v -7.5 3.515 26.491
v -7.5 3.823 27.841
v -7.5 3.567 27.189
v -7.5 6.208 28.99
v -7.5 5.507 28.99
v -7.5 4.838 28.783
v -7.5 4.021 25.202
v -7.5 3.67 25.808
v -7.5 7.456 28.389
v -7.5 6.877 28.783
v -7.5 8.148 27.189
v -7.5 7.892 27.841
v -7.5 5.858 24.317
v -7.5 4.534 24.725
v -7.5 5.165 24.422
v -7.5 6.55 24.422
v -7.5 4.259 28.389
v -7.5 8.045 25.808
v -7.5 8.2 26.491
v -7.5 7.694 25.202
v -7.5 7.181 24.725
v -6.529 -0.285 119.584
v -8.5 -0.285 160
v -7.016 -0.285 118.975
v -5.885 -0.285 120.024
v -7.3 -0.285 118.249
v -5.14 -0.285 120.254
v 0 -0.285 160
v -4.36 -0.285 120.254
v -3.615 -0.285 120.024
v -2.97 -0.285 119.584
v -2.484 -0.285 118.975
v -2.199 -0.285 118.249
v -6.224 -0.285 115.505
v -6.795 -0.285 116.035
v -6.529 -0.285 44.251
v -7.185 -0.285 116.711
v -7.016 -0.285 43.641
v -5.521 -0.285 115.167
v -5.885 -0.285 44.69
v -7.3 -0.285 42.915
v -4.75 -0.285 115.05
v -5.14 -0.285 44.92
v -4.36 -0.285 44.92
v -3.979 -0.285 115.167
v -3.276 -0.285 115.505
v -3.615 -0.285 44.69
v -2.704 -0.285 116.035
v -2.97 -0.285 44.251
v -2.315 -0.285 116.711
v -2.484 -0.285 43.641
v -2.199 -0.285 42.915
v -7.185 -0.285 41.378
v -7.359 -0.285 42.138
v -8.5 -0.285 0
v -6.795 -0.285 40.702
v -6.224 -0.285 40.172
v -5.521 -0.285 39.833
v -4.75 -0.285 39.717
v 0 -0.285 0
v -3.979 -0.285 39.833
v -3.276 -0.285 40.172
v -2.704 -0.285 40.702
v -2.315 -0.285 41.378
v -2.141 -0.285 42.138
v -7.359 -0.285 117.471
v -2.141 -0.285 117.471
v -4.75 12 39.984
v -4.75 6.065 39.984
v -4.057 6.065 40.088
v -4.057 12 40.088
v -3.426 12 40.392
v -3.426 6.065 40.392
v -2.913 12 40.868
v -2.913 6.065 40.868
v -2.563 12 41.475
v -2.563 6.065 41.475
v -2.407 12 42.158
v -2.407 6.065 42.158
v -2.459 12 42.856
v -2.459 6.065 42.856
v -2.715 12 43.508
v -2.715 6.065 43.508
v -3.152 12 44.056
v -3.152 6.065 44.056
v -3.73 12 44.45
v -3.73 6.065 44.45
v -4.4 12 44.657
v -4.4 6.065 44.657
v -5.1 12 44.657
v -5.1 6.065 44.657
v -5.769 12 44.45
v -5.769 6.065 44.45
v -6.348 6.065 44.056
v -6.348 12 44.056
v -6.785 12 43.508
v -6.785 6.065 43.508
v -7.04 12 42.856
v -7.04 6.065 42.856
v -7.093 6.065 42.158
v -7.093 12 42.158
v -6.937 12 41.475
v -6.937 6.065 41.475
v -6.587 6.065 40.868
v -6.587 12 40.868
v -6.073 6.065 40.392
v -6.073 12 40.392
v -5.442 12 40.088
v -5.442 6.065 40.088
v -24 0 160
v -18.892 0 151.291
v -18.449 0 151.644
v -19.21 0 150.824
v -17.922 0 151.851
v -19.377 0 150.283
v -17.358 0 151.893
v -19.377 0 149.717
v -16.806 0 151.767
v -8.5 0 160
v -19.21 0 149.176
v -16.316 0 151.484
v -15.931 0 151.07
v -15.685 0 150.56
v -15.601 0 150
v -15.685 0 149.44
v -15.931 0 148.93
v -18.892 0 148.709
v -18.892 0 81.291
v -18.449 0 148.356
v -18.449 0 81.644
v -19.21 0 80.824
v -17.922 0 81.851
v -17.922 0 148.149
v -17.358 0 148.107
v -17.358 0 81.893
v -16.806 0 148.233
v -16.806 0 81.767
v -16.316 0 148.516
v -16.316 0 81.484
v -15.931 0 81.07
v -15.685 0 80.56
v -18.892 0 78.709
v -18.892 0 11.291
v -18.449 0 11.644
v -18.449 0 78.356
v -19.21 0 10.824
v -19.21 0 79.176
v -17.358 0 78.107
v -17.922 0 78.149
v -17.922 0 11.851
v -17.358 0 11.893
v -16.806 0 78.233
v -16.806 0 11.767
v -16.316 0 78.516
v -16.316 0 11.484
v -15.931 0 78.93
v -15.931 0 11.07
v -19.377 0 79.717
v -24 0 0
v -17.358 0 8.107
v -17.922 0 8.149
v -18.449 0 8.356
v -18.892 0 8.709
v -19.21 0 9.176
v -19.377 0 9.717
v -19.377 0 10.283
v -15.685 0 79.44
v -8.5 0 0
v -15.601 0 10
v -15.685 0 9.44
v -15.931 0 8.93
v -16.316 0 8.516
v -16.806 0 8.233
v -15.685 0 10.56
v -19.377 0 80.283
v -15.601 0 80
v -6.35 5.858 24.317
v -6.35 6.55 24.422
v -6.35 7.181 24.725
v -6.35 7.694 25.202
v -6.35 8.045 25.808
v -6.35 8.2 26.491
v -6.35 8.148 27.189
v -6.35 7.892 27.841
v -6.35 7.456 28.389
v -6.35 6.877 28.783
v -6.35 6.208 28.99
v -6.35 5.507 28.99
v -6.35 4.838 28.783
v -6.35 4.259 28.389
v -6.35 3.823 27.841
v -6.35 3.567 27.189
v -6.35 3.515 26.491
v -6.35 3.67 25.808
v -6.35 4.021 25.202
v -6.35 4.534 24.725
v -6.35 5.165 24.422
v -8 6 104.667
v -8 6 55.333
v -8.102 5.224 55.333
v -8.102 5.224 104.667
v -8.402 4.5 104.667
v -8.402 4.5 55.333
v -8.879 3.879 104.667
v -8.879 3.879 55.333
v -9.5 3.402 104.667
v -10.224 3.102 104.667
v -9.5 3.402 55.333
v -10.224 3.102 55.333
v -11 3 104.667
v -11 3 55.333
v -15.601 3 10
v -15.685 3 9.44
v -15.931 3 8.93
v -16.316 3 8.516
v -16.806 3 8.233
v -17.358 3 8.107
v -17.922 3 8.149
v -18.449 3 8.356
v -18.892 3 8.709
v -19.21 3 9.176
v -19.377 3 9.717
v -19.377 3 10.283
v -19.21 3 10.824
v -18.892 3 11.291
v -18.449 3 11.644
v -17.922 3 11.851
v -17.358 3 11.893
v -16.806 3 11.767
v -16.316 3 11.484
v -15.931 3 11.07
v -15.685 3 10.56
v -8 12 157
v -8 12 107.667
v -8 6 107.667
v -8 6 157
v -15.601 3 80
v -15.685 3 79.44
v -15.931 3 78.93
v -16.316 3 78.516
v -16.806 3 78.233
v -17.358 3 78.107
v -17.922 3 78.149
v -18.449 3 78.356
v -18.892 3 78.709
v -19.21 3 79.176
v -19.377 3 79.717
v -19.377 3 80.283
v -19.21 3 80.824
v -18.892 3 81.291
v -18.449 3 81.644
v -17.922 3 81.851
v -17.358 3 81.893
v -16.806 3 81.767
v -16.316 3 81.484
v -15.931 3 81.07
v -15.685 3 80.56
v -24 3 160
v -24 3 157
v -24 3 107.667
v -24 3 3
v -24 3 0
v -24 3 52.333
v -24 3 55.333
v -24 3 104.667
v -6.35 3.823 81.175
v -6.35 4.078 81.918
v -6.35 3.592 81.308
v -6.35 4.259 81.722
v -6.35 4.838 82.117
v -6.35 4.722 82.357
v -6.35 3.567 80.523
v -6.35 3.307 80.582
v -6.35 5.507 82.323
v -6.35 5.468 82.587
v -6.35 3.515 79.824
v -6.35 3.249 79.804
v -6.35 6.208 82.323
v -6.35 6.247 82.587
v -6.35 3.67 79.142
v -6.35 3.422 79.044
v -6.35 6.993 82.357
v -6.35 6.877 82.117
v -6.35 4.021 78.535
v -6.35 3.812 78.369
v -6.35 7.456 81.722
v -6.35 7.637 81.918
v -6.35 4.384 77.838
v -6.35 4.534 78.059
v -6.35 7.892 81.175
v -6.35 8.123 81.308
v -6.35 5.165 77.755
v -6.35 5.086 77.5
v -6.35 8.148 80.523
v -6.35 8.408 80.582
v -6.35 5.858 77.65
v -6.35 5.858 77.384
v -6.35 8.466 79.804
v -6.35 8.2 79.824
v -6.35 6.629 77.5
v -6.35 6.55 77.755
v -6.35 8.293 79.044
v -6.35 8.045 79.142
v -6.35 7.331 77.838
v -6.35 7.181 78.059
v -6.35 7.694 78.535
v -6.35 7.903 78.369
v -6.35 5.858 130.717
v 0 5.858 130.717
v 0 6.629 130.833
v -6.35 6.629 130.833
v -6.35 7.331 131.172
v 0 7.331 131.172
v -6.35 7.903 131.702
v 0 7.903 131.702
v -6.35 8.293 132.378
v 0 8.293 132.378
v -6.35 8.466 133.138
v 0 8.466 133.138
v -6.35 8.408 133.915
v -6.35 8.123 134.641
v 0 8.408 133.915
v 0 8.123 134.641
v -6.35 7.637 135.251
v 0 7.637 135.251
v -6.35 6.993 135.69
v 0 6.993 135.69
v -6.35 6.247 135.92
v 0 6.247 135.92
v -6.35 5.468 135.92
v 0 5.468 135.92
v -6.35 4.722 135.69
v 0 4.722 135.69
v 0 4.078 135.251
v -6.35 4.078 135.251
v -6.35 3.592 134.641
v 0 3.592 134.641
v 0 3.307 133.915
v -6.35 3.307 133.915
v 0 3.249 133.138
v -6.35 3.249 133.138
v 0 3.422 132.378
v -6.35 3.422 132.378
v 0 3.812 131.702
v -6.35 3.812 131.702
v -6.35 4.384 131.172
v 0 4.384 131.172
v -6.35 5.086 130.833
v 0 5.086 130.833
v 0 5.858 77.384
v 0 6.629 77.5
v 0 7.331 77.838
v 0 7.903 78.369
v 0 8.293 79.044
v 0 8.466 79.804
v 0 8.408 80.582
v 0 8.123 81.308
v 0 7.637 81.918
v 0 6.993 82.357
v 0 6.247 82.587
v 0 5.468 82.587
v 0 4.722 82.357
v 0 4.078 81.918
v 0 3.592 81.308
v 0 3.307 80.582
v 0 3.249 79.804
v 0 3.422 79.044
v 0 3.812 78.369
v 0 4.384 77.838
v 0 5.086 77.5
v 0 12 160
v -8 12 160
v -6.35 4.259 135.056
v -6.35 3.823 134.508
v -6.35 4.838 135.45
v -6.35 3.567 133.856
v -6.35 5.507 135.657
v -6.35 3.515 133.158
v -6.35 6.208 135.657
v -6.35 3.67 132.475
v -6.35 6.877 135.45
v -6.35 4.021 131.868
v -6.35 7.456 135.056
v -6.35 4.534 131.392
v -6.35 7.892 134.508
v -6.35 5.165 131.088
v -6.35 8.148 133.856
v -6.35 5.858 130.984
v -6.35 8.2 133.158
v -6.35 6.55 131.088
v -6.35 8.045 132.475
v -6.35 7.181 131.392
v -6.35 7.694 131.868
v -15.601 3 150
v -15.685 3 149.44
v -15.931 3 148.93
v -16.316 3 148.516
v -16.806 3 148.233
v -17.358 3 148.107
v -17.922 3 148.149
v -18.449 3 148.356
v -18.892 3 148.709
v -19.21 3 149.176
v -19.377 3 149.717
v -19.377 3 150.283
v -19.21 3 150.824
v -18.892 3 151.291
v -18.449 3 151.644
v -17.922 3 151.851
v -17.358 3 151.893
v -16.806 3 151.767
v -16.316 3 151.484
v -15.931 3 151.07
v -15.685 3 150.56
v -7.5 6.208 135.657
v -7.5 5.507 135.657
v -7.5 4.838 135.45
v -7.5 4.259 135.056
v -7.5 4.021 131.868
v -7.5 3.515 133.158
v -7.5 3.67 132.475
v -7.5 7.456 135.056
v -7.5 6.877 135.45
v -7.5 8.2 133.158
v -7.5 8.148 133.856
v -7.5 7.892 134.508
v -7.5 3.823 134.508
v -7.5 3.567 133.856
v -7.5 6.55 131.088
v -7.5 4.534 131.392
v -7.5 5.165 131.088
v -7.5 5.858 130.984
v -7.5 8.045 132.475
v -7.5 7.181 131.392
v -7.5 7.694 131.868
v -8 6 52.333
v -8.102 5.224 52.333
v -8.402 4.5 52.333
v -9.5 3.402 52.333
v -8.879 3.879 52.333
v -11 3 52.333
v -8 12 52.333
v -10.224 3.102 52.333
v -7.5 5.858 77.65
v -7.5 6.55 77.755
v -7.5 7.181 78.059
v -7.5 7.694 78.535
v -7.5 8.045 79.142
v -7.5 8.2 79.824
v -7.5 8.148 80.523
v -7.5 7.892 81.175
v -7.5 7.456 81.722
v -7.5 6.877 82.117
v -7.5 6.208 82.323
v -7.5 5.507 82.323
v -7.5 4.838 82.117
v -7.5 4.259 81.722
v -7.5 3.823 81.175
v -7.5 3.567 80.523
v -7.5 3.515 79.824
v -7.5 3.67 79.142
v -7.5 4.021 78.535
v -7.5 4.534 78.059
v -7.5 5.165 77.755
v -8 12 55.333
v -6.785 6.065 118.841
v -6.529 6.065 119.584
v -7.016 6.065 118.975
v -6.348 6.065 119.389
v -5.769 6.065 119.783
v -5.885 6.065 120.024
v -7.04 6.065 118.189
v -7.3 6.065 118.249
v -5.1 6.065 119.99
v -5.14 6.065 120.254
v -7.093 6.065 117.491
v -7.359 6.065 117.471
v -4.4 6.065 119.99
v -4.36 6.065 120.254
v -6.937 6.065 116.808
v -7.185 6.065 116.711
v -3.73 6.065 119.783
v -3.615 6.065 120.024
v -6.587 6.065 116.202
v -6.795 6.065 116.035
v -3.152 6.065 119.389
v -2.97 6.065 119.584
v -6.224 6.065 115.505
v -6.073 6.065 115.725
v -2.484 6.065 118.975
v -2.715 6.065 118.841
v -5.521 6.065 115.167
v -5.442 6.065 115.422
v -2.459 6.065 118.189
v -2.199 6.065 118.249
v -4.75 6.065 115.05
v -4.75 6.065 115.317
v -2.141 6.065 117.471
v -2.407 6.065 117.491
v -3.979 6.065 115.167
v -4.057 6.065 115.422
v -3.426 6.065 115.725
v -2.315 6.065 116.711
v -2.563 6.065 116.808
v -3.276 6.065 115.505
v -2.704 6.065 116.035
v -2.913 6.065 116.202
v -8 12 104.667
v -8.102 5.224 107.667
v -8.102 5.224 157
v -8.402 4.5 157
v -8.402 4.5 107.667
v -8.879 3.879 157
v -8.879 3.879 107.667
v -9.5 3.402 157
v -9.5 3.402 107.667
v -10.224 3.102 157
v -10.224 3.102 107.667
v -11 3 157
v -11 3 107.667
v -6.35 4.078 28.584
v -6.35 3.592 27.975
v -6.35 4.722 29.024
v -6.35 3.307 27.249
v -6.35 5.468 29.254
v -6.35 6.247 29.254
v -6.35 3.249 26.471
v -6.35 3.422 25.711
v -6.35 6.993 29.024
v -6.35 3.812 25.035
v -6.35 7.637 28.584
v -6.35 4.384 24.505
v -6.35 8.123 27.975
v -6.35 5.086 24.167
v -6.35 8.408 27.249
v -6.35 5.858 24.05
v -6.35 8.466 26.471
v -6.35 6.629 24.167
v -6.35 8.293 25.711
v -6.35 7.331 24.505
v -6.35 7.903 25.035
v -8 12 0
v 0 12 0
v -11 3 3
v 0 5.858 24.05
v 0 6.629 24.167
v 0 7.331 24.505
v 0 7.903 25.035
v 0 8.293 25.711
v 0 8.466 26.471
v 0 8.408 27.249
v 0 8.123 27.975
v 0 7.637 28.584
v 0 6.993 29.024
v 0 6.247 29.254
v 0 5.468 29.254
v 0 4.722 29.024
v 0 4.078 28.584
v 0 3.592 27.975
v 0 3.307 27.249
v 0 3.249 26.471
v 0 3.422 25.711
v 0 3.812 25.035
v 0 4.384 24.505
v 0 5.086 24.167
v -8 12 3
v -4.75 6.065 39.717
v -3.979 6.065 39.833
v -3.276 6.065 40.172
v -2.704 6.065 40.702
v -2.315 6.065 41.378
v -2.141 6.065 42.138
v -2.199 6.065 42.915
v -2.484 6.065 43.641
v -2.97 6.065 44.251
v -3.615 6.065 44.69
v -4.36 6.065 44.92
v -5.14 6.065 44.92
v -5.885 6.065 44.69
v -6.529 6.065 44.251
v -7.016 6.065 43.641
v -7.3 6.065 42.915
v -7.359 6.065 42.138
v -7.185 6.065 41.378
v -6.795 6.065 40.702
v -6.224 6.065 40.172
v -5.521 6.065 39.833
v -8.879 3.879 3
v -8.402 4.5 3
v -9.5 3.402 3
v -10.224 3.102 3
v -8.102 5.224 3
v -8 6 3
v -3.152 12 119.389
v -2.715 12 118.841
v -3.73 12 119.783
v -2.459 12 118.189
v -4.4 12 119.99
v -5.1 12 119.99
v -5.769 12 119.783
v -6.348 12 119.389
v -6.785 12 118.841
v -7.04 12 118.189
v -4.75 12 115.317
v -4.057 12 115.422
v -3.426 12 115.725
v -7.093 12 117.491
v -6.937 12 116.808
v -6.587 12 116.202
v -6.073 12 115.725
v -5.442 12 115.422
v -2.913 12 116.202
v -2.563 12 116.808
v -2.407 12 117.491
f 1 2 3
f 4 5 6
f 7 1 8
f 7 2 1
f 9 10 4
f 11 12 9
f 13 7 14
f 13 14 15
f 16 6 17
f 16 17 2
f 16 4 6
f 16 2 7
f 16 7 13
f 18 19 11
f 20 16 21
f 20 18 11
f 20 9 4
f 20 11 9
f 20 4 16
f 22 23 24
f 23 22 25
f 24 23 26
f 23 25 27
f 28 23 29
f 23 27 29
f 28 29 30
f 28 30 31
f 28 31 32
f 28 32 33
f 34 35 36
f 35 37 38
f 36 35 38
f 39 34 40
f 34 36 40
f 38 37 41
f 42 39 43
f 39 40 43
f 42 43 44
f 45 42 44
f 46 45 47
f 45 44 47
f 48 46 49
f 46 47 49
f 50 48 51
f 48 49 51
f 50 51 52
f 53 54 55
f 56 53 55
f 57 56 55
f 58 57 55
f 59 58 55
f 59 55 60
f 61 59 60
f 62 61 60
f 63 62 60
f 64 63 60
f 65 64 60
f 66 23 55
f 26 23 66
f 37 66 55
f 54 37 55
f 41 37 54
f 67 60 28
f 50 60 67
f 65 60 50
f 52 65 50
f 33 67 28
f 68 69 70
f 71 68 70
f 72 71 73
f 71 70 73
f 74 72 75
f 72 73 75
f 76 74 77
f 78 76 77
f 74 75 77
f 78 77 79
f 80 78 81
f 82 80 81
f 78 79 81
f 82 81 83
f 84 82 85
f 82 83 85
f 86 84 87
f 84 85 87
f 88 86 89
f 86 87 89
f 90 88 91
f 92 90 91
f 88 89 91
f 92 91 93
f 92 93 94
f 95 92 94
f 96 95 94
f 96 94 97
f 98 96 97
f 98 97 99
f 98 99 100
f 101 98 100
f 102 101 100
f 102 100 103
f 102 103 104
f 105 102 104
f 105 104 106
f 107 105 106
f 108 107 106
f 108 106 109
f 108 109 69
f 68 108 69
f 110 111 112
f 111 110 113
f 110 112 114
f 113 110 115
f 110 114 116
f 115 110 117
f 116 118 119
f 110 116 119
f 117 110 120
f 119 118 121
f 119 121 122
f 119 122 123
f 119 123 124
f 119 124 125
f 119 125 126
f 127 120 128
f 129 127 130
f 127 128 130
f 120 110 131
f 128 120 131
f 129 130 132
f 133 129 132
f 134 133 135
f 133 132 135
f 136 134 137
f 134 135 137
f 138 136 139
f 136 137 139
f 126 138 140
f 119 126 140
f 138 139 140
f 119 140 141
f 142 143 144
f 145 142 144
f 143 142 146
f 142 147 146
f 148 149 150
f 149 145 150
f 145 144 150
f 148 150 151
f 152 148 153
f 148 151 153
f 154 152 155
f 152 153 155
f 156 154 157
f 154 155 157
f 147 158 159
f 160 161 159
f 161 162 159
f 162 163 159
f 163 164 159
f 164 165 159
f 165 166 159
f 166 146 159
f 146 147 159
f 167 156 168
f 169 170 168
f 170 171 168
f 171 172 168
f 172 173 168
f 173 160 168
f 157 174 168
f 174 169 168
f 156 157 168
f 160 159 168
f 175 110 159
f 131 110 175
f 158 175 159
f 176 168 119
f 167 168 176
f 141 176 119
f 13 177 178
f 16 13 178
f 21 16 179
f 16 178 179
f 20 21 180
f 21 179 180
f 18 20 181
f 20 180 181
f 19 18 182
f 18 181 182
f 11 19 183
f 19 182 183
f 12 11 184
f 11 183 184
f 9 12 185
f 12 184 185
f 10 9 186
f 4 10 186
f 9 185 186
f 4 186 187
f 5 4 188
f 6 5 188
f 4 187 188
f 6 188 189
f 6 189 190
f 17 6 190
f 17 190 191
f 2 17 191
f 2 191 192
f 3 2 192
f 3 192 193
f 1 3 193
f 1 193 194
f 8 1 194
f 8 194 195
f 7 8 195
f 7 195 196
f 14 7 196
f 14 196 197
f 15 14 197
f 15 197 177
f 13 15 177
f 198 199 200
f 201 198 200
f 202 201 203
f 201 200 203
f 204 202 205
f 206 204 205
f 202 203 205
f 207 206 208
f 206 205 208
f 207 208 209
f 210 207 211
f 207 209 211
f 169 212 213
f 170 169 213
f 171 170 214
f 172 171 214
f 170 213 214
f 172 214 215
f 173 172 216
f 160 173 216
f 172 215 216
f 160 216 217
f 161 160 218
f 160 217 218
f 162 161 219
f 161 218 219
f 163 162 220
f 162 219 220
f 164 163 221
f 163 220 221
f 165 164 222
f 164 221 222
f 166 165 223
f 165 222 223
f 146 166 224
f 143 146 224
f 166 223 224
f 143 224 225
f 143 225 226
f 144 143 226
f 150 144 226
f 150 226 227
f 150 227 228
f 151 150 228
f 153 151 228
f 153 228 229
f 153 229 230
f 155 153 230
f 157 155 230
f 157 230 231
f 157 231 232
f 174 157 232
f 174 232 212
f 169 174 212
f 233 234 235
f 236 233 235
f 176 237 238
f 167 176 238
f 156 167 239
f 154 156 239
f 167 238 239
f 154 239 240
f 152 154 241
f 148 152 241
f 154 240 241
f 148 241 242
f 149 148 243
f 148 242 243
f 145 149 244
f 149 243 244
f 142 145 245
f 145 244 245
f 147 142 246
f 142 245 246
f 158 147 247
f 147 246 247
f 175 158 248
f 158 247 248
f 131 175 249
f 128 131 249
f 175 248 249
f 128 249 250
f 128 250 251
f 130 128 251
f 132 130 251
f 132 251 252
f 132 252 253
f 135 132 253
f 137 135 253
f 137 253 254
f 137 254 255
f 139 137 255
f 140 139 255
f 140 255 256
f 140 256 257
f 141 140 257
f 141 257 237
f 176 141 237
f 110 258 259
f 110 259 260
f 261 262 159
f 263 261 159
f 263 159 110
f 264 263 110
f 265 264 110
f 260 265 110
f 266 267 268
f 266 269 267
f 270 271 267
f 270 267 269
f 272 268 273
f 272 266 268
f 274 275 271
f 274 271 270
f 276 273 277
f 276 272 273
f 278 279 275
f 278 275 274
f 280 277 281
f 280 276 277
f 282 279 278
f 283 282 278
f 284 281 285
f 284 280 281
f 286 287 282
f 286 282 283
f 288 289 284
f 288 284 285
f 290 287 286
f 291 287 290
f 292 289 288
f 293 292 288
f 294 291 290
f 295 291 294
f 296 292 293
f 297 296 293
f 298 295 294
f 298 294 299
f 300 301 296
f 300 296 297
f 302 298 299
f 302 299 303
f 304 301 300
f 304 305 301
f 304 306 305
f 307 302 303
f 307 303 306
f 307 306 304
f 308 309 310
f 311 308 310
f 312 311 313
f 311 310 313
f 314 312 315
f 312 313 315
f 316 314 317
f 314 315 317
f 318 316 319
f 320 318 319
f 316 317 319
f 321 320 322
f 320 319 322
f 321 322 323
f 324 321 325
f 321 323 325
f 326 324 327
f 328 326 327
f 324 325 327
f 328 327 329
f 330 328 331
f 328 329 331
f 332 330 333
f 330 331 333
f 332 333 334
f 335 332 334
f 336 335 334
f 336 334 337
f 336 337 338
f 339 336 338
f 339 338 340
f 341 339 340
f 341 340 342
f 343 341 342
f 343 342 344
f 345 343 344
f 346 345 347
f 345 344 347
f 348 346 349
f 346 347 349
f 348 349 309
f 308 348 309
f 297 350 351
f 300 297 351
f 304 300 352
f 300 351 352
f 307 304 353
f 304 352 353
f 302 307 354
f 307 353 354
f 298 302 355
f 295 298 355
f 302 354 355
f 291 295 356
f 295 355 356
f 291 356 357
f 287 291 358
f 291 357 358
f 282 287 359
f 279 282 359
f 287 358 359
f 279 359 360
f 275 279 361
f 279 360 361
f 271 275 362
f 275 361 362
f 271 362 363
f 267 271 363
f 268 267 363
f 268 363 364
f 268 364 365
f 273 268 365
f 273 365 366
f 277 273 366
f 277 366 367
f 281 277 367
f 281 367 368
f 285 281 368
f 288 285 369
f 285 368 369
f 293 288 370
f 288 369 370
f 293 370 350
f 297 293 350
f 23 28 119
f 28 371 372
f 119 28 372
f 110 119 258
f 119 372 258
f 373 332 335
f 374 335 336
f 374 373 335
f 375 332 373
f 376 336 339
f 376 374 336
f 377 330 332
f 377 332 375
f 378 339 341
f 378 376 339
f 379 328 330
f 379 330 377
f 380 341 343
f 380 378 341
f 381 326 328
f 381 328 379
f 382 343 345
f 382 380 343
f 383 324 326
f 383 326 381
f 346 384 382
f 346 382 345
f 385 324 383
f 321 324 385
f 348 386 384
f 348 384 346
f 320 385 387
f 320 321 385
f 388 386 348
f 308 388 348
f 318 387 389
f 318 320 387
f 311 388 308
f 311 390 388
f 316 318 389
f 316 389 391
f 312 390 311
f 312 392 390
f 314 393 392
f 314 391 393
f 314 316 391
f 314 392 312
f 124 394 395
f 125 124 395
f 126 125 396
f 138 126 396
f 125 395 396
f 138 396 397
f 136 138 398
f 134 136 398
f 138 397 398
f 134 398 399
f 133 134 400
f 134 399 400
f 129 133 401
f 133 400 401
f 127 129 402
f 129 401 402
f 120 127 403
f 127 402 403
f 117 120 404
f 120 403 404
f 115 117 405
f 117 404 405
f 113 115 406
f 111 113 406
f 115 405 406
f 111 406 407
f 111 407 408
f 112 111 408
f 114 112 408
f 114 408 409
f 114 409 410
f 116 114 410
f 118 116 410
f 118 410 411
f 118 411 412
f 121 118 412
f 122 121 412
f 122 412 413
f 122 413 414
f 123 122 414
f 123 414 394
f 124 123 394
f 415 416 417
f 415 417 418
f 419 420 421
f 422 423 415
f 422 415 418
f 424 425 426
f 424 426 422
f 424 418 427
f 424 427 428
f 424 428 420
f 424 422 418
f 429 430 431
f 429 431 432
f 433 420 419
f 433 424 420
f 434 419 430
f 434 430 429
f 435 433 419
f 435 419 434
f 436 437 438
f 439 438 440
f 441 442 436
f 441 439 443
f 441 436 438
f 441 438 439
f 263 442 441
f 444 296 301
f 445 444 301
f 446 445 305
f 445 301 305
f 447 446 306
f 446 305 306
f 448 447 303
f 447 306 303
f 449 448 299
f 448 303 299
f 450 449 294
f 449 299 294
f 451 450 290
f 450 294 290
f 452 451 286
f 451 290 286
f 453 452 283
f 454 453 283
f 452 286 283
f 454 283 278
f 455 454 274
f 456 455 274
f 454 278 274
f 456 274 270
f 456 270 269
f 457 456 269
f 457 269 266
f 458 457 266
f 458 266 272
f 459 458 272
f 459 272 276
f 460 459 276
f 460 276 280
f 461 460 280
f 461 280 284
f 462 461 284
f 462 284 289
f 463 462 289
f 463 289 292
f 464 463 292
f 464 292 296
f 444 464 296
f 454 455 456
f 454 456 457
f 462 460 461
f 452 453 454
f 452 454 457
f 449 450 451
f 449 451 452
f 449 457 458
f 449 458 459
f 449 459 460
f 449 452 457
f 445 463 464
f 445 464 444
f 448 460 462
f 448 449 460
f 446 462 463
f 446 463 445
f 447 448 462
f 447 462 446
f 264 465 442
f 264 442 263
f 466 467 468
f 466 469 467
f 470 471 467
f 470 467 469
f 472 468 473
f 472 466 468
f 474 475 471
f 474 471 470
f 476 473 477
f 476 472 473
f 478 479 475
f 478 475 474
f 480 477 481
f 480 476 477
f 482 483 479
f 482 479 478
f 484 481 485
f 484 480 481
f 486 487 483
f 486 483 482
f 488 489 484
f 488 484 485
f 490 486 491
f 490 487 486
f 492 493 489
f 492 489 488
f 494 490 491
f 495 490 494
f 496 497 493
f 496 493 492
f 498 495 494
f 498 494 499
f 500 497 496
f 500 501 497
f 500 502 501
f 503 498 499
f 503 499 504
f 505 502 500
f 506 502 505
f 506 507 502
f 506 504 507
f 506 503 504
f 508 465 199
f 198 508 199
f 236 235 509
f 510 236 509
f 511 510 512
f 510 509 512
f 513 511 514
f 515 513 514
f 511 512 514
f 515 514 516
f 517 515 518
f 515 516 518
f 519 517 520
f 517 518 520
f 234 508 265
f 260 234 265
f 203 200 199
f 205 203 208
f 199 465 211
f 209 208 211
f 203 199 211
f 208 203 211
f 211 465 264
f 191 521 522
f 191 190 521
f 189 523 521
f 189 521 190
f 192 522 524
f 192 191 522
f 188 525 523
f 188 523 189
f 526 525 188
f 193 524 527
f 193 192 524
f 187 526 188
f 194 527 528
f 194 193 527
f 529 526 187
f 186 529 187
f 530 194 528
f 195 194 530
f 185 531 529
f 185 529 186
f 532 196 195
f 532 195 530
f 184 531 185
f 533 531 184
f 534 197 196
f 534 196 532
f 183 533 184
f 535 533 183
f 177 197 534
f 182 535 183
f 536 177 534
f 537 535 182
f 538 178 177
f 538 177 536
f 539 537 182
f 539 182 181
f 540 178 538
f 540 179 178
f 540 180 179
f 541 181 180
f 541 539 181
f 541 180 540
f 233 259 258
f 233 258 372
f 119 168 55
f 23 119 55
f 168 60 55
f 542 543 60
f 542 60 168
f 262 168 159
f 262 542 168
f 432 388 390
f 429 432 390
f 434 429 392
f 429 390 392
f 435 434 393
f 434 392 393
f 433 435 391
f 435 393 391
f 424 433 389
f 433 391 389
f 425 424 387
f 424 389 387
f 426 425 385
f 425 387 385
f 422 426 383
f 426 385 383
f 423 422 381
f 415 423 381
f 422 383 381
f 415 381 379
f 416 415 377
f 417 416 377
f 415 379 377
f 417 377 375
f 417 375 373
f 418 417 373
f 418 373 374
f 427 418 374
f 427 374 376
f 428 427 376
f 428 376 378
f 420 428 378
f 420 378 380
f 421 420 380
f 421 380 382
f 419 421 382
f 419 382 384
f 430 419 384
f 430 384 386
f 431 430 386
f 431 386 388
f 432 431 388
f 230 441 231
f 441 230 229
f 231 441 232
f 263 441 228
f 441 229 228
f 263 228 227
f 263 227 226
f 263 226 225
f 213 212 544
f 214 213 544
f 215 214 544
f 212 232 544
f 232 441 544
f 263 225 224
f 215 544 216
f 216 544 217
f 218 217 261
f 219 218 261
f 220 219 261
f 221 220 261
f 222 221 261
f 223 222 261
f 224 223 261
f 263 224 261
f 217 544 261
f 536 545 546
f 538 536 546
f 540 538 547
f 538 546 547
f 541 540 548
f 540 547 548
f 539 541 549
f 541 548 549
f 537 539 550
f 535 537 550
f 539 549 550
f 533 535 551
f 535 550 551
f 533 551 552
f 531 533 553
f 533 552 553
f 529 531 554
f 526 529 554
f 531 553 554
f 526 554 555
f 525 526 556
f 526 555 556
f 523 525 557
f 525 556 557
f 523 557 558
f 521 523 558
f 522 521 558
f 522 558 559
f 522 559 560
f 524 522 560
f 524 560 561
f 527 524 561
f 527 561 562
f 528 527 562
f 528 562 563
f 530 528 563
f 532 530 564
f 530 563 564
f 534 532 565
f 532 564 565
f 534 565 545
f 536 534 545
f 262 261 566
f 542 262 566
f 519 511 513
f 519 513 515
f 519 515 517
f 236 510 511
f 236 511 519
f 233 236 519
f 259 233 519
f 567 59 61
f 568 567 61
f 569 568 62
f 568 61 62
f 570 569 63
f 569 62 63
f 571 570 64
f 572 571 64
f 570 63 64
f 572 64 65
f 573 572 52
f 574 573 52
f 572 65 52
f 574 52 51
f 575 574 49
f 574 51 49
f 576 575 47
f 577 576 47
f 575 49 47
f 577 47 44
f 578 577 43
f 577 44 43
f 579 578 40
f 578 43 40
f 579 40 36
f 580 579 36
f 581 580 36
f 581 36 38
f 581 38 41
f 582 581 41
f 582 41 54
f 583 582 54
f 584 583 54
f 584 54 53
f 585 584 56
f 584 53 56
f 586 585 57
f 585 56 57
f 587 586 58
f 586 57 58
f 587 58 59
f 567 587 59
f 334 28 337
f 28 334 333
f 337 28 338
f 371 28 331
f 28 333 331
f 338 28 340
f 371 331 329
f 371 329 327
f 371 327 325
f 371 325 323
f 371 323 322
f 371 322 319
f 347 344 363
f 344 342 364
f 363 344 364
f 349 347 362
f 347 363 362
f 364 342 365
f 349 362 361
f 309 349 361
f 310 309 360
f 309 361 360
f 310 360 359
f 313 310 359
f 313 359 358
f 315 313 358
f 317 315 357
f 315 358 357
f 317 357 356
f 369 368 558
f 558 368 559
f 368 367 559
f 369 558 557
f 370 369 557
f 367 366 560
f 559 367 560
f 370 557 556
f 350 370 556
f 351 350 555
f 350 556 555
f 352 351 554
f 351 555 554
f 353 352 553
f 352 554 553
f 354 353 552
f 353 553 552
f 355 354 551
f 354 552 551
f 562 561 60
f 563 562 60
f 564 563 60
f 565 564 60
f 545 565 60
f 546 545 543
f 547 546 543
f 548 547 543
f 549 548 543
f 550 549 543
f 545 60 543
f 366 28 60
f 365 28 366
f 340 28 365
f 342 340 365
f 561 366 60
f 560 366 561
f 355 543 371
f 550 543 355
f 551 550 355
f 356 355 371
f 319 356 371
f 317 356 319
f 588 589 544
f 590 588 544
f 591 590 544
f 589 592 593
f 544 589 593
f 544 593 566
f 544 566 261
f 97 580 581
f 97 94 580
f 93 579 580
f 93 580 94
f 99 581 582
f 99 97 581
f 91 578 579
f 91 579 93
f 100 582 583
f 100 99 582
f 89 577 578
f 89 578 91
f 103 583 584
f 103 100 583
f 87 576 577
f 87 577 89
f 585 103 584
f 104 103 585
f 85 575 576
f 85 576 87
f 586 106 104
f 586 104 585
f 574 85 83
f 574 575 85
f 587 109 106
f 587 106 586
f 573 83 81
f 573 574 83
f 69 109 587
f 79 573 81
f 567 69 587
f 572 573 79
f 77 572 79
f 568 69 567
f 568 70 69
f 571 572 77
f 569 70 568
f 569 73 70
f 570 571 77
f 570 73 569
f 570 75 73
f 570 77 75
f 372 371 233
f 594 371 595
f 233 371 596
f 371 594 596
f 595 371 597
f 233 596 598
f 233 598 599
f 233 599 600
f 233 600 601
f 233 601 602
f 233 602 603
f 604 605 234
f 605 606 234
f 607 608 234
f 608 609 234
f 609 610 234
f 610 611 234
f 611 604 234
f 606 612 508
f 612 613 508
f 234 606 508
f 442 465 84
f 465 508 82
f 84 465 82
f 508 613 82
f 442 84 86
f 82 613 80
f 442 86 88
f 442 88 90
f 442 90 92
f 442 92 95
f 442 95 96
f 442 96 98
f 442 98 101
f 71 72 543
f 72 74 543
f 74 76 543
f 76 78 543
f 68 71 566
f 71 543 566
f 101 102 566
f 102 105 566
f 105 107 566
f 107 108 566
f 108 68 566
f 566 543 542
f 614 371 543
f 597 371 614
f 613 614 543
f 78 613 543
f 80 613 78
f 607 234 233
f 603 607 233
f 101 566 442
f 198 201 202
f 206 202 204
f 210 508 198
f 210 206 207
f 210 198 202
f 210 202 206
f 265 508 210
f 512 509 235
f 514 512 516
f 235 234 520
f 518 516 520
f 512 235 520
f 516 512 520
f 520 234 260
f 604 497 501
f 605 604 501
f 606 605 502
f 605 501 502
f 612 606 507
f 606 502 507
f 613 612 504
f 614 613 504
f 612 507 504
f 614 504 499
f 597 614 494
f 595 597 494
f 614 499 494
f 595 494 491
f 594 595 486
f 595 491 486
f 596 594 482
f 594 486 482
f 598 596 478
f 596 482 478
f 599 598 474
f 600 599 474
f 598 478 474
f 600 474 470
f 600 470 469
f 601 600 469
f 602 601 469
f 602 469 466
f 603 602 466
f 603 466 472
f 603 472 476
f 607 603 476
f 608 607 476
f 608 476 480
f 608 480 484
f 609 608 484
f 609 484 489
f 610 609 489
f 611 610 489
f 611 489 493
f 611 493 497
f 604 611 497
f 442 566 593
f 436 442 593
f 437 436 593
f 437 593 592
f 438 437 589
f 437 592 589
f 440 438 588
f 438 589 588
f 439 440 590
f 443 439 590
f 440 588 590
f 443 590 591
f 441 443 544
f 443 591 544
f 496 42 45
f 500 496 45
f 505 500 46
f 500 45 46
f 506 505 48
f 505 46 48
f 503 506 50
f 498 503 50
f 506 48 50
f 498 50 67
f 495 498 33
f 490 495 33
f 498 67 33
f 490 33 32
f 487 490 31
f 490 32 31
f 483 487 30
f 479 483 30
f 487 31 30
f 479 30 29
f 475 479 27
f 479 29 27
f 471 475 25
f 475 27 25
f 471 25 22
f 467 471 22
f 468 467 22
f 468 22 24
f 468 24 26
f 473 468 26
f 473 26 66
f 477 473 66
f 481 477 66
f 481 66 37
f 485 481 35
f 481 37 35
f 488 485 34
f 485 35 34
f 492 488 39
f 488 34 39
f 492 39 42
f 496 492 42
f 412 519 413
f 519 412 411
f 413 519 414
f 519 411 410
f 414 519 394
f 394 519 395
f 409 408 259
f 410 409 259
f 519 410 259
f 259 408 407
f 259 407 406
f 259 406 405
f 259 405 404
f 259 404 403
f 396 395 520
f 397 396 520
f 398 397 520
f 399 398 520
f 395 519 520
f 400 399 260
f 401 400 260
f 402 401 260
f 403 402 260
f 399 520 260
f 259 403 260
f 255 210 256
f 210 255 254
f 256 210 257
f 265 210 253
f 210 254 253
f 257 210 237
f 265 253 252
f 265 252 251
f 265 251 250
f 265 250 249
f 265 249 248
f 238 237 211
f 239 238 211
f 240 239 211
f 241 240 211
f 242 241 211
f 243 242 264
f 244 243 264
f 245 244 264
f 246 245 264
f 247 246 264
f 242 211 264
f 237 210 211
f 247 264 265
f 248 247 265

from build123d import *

# Parameters (mm, degrees)
BOSS_EXTRUDE1_DEPTH   = 160
RIB3_REACH            = 111.505
SKETCH4_WALL_W        = 239.367706636
SKETCH4_WALL_H        = 3
RIB4_REACH            = 164.234
SKETCH5_WALL_W        = 344.826356402
SKETCH5_WALL_H        = 3
F_6_CLEARANCE_HOLE1_D = 3.7973
SKETCH18_R            = 2.3495
CUT_EXTRUDE1_DEPTH    = 7.5
SKETCH19_R            = 2.6162
CUT_EXTRUDE2_DEPTH    = 6.35
SKETCH10_R            = 2.3495
CUT_EXTRUDE3_DEPTH    = 163.255727865
SKETCH20_R            = 2.6162
CUT_EXTRUDE4_DEPTH    = 6.35


with BuildPart() as part:
    # Sketch1 → Boss-Extrude1 (new body)
    with BuildSketch(Plane.XY):
        with BuildLine():
            Line((0, 0), (0, 12))
            Line((0, 12), (-8, 12))
            Line((-8, 12), (-8, 6))
            ThreePointArc((-8, 6), (-8.878679656, 3.878679656), (-11, 3))
            Line((-11, 3), (-24, 3))
            Line((-24, 3), (-24, 0))
            Line((-24, 0), (-8.5, 0))
            Line((-8.5, 0), (-8.5, -0.285))
            Line((-8.5, -0.285), (0, -0.285))
            Line((0, -0.285), (0, 0))
        make_face()
    extrude(amount=BOSS_EXTRUDE1_DEPTH)

    # Sketch4 wall → Rib3 (add, up to next)
    with BuildSketch(Plane(origin=(-16, 7.5, 53.83333334), x_dir=(-0.871575537125, -0.490261239633, 0), z_dir=(-0.490261239633, 0.871575537125, 0)), mode=Mode.PRIVATE) as rib3_sk1:
        Rectangle(SKETCH4_WALL_W, SKETCH4_WALL_H)
    rib3_tool1 = extrude(rib3_sk1.sketch, amount=-RIB3_REACH, mode=Mode.PRIVATE) - part.part
    rib3 = rib3_tool1.solids().sort_by_distance((-16, 7.5, 53.83333334))[0]
    add(rib3)

    # Sketch5 wall → Rib4 (add, up to next)
    with BuildSketch(Plane(origin=(-16, 7.5, 0), x_dir=(-0.871575537125, -0.490261239633, 0), z_dir=(-0.490261239633, 0.871575537125, 0)), mode=Mode.PRIVATE) as rib4_sk1:
        with Locations((0, 1.5)):
            Rectangle(SKETCH5_WALL_W, SKETCH5_WALL_H)
    rib4_tool1 = extrude(rib4_sk1.sketch, amount=-RIB4_REACH, mode=Mode.PRIVATE) - part.part
    rib4 = rib4_tool1.solids().sort_by_distance((-16, 7.5, 0))[0]
    add(rib4)

    # Mirror1: Rib3, Rib4 across plane
    add(rib3.mirror(Plane(origin=(0, 0, 80), x_dir=(1, 0, 0), z_dir=(0, 0, -1))))
    add(rib4.mirror(Plane(origin=(0, 0, 80), x_dir=(1, 0, 0), z_dir=(0, 0, -1))))

    # #6 Clearance Hole1 (through all)
    with Locations(Plane(origin=(0, 0, 0), x_dir=(-1, 0, 0), z_dir=(0, -1, 0))):
        with Locations((17.49975, -10), (17.49975, -80), (17.49975, -150)):
            Hole(F_6_CLEARANCE_HOLE1_D / 2)

    # Sketch18 → Cut-Extrude1 (cut)
    with BuildSketch(Plane(origin=(0, 0, 0), x_dir=(0, 0, -1), z_dir=(1, 0, 0))):
        with Locations((-133.333333335, 5.8575)):
            Circle(SKETCH18_R)
        with Locations((-26.666666667, 5.8575)):
            Circle(SKETCH18_R)
        with Locations((-80, 5.8575)):
            Circle(SKETCH18_R)
    extrude(amount=-CUT_EXTRUDE1_DEPTH, mode=Mode.SUBTRACT)

    # Sketch19 → Cut-Extrude2 (cut)
    with BuildSketch(Plane(origin=(0, 0, 0), x_dir=(0, 0, -1), z_dir=(1, 0, 0))):
        with Locations((-133.333333335, 5.8575)):
            Circle(SKETCH19_R)
        with Locations((-26.666666667, 5.8575)):
            Circle(SKETCH19_R)
        with Locations((-80, 5.8575)):
            Circle(SKETCH19_R)
    extrude(amount=-CUT_EXTRUDE2_DEPTH, mode=Mode.SUBTRACT)

    # Sketch10 → Cut-Extrude3 (cut, through all)
    with BuildSketch(Plane(origin=(0, -0.285, 0), x_dir=(-1, 0, 0), z_dir=(0, -1, 0))):
        with Locations((4.749875, -42.33333334)):
            Circle(SKETCH10_R)
        with Locations((4.749875, -117.66666666)):
            Circle(SKETCH10_R)
    extrude(amount=-CUT_EXTRUDE3_DEPTH, mode=Mode.SUBTRACT)

    # Sketch20 → Cut-Extrude4 (cut)
    with BuildSketch(Plane.XZ.offset(0.285)):
        with Locations((-4.749875, 117.66666666)):
            Circle(SKETCH20_R)
        with Locations((-4.749875, 42.33333334)):
            Circle(SKETCH20_R)
    extrude(amount=-CUT_EXTRUDE4_DEPTH, mode=Mode.SUBTRACT)


solid = part.part
